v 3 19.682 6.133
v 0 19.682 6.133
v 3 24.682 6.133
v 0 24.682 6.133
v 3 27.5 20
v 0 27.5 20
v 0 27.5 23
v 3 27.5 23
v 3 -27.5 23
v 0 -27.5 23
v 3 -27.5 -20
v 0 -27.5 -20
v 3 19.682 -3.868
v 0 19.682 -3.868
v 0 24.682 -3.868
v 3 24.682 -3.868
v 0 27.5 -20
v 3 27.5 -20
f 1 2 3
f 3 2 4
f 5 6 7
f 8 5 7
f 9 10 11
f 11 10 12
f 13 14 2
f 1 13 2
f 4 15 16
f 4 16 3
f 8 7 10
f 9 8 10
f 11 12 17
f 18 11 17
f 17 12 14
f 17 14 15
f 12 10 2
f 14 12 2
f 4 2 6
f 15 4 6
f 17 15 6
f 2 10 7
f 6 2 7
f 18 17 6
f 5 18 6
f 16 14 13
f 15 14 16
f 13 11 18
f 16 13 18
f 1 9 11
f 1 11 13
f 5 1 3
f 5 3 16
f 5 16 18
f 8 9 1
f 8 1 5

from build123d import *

# Parameters (mm, degrees)
F0_W     = 5.000215
F0_H     = 10.000086
F1_DEPTH = 3


# Not quite as in the source:
# - ends of sketch curves that miss each other by under 0.0002 mm in the source are joined


with BuildPart() as f1:
    # F0 (on Right) → F1 (new body)
    with BuildSketch(Plane.YZ):
        Polygon((-27.499976, 19.999999), (-27.499976, -19.999998), (27.499976, -19.999998), (27.500024, 19.999999), (27.499976, 23.000002), (-27.499976, 23.000002), align=None)
        with Locations((22.1822251524, 1.1325399325)):
            Rectangle(F0_W, F0_H, mode=Mode.SUBTRACT)
    extrude(amount=F1_DEPTH)


solid = f1.part
